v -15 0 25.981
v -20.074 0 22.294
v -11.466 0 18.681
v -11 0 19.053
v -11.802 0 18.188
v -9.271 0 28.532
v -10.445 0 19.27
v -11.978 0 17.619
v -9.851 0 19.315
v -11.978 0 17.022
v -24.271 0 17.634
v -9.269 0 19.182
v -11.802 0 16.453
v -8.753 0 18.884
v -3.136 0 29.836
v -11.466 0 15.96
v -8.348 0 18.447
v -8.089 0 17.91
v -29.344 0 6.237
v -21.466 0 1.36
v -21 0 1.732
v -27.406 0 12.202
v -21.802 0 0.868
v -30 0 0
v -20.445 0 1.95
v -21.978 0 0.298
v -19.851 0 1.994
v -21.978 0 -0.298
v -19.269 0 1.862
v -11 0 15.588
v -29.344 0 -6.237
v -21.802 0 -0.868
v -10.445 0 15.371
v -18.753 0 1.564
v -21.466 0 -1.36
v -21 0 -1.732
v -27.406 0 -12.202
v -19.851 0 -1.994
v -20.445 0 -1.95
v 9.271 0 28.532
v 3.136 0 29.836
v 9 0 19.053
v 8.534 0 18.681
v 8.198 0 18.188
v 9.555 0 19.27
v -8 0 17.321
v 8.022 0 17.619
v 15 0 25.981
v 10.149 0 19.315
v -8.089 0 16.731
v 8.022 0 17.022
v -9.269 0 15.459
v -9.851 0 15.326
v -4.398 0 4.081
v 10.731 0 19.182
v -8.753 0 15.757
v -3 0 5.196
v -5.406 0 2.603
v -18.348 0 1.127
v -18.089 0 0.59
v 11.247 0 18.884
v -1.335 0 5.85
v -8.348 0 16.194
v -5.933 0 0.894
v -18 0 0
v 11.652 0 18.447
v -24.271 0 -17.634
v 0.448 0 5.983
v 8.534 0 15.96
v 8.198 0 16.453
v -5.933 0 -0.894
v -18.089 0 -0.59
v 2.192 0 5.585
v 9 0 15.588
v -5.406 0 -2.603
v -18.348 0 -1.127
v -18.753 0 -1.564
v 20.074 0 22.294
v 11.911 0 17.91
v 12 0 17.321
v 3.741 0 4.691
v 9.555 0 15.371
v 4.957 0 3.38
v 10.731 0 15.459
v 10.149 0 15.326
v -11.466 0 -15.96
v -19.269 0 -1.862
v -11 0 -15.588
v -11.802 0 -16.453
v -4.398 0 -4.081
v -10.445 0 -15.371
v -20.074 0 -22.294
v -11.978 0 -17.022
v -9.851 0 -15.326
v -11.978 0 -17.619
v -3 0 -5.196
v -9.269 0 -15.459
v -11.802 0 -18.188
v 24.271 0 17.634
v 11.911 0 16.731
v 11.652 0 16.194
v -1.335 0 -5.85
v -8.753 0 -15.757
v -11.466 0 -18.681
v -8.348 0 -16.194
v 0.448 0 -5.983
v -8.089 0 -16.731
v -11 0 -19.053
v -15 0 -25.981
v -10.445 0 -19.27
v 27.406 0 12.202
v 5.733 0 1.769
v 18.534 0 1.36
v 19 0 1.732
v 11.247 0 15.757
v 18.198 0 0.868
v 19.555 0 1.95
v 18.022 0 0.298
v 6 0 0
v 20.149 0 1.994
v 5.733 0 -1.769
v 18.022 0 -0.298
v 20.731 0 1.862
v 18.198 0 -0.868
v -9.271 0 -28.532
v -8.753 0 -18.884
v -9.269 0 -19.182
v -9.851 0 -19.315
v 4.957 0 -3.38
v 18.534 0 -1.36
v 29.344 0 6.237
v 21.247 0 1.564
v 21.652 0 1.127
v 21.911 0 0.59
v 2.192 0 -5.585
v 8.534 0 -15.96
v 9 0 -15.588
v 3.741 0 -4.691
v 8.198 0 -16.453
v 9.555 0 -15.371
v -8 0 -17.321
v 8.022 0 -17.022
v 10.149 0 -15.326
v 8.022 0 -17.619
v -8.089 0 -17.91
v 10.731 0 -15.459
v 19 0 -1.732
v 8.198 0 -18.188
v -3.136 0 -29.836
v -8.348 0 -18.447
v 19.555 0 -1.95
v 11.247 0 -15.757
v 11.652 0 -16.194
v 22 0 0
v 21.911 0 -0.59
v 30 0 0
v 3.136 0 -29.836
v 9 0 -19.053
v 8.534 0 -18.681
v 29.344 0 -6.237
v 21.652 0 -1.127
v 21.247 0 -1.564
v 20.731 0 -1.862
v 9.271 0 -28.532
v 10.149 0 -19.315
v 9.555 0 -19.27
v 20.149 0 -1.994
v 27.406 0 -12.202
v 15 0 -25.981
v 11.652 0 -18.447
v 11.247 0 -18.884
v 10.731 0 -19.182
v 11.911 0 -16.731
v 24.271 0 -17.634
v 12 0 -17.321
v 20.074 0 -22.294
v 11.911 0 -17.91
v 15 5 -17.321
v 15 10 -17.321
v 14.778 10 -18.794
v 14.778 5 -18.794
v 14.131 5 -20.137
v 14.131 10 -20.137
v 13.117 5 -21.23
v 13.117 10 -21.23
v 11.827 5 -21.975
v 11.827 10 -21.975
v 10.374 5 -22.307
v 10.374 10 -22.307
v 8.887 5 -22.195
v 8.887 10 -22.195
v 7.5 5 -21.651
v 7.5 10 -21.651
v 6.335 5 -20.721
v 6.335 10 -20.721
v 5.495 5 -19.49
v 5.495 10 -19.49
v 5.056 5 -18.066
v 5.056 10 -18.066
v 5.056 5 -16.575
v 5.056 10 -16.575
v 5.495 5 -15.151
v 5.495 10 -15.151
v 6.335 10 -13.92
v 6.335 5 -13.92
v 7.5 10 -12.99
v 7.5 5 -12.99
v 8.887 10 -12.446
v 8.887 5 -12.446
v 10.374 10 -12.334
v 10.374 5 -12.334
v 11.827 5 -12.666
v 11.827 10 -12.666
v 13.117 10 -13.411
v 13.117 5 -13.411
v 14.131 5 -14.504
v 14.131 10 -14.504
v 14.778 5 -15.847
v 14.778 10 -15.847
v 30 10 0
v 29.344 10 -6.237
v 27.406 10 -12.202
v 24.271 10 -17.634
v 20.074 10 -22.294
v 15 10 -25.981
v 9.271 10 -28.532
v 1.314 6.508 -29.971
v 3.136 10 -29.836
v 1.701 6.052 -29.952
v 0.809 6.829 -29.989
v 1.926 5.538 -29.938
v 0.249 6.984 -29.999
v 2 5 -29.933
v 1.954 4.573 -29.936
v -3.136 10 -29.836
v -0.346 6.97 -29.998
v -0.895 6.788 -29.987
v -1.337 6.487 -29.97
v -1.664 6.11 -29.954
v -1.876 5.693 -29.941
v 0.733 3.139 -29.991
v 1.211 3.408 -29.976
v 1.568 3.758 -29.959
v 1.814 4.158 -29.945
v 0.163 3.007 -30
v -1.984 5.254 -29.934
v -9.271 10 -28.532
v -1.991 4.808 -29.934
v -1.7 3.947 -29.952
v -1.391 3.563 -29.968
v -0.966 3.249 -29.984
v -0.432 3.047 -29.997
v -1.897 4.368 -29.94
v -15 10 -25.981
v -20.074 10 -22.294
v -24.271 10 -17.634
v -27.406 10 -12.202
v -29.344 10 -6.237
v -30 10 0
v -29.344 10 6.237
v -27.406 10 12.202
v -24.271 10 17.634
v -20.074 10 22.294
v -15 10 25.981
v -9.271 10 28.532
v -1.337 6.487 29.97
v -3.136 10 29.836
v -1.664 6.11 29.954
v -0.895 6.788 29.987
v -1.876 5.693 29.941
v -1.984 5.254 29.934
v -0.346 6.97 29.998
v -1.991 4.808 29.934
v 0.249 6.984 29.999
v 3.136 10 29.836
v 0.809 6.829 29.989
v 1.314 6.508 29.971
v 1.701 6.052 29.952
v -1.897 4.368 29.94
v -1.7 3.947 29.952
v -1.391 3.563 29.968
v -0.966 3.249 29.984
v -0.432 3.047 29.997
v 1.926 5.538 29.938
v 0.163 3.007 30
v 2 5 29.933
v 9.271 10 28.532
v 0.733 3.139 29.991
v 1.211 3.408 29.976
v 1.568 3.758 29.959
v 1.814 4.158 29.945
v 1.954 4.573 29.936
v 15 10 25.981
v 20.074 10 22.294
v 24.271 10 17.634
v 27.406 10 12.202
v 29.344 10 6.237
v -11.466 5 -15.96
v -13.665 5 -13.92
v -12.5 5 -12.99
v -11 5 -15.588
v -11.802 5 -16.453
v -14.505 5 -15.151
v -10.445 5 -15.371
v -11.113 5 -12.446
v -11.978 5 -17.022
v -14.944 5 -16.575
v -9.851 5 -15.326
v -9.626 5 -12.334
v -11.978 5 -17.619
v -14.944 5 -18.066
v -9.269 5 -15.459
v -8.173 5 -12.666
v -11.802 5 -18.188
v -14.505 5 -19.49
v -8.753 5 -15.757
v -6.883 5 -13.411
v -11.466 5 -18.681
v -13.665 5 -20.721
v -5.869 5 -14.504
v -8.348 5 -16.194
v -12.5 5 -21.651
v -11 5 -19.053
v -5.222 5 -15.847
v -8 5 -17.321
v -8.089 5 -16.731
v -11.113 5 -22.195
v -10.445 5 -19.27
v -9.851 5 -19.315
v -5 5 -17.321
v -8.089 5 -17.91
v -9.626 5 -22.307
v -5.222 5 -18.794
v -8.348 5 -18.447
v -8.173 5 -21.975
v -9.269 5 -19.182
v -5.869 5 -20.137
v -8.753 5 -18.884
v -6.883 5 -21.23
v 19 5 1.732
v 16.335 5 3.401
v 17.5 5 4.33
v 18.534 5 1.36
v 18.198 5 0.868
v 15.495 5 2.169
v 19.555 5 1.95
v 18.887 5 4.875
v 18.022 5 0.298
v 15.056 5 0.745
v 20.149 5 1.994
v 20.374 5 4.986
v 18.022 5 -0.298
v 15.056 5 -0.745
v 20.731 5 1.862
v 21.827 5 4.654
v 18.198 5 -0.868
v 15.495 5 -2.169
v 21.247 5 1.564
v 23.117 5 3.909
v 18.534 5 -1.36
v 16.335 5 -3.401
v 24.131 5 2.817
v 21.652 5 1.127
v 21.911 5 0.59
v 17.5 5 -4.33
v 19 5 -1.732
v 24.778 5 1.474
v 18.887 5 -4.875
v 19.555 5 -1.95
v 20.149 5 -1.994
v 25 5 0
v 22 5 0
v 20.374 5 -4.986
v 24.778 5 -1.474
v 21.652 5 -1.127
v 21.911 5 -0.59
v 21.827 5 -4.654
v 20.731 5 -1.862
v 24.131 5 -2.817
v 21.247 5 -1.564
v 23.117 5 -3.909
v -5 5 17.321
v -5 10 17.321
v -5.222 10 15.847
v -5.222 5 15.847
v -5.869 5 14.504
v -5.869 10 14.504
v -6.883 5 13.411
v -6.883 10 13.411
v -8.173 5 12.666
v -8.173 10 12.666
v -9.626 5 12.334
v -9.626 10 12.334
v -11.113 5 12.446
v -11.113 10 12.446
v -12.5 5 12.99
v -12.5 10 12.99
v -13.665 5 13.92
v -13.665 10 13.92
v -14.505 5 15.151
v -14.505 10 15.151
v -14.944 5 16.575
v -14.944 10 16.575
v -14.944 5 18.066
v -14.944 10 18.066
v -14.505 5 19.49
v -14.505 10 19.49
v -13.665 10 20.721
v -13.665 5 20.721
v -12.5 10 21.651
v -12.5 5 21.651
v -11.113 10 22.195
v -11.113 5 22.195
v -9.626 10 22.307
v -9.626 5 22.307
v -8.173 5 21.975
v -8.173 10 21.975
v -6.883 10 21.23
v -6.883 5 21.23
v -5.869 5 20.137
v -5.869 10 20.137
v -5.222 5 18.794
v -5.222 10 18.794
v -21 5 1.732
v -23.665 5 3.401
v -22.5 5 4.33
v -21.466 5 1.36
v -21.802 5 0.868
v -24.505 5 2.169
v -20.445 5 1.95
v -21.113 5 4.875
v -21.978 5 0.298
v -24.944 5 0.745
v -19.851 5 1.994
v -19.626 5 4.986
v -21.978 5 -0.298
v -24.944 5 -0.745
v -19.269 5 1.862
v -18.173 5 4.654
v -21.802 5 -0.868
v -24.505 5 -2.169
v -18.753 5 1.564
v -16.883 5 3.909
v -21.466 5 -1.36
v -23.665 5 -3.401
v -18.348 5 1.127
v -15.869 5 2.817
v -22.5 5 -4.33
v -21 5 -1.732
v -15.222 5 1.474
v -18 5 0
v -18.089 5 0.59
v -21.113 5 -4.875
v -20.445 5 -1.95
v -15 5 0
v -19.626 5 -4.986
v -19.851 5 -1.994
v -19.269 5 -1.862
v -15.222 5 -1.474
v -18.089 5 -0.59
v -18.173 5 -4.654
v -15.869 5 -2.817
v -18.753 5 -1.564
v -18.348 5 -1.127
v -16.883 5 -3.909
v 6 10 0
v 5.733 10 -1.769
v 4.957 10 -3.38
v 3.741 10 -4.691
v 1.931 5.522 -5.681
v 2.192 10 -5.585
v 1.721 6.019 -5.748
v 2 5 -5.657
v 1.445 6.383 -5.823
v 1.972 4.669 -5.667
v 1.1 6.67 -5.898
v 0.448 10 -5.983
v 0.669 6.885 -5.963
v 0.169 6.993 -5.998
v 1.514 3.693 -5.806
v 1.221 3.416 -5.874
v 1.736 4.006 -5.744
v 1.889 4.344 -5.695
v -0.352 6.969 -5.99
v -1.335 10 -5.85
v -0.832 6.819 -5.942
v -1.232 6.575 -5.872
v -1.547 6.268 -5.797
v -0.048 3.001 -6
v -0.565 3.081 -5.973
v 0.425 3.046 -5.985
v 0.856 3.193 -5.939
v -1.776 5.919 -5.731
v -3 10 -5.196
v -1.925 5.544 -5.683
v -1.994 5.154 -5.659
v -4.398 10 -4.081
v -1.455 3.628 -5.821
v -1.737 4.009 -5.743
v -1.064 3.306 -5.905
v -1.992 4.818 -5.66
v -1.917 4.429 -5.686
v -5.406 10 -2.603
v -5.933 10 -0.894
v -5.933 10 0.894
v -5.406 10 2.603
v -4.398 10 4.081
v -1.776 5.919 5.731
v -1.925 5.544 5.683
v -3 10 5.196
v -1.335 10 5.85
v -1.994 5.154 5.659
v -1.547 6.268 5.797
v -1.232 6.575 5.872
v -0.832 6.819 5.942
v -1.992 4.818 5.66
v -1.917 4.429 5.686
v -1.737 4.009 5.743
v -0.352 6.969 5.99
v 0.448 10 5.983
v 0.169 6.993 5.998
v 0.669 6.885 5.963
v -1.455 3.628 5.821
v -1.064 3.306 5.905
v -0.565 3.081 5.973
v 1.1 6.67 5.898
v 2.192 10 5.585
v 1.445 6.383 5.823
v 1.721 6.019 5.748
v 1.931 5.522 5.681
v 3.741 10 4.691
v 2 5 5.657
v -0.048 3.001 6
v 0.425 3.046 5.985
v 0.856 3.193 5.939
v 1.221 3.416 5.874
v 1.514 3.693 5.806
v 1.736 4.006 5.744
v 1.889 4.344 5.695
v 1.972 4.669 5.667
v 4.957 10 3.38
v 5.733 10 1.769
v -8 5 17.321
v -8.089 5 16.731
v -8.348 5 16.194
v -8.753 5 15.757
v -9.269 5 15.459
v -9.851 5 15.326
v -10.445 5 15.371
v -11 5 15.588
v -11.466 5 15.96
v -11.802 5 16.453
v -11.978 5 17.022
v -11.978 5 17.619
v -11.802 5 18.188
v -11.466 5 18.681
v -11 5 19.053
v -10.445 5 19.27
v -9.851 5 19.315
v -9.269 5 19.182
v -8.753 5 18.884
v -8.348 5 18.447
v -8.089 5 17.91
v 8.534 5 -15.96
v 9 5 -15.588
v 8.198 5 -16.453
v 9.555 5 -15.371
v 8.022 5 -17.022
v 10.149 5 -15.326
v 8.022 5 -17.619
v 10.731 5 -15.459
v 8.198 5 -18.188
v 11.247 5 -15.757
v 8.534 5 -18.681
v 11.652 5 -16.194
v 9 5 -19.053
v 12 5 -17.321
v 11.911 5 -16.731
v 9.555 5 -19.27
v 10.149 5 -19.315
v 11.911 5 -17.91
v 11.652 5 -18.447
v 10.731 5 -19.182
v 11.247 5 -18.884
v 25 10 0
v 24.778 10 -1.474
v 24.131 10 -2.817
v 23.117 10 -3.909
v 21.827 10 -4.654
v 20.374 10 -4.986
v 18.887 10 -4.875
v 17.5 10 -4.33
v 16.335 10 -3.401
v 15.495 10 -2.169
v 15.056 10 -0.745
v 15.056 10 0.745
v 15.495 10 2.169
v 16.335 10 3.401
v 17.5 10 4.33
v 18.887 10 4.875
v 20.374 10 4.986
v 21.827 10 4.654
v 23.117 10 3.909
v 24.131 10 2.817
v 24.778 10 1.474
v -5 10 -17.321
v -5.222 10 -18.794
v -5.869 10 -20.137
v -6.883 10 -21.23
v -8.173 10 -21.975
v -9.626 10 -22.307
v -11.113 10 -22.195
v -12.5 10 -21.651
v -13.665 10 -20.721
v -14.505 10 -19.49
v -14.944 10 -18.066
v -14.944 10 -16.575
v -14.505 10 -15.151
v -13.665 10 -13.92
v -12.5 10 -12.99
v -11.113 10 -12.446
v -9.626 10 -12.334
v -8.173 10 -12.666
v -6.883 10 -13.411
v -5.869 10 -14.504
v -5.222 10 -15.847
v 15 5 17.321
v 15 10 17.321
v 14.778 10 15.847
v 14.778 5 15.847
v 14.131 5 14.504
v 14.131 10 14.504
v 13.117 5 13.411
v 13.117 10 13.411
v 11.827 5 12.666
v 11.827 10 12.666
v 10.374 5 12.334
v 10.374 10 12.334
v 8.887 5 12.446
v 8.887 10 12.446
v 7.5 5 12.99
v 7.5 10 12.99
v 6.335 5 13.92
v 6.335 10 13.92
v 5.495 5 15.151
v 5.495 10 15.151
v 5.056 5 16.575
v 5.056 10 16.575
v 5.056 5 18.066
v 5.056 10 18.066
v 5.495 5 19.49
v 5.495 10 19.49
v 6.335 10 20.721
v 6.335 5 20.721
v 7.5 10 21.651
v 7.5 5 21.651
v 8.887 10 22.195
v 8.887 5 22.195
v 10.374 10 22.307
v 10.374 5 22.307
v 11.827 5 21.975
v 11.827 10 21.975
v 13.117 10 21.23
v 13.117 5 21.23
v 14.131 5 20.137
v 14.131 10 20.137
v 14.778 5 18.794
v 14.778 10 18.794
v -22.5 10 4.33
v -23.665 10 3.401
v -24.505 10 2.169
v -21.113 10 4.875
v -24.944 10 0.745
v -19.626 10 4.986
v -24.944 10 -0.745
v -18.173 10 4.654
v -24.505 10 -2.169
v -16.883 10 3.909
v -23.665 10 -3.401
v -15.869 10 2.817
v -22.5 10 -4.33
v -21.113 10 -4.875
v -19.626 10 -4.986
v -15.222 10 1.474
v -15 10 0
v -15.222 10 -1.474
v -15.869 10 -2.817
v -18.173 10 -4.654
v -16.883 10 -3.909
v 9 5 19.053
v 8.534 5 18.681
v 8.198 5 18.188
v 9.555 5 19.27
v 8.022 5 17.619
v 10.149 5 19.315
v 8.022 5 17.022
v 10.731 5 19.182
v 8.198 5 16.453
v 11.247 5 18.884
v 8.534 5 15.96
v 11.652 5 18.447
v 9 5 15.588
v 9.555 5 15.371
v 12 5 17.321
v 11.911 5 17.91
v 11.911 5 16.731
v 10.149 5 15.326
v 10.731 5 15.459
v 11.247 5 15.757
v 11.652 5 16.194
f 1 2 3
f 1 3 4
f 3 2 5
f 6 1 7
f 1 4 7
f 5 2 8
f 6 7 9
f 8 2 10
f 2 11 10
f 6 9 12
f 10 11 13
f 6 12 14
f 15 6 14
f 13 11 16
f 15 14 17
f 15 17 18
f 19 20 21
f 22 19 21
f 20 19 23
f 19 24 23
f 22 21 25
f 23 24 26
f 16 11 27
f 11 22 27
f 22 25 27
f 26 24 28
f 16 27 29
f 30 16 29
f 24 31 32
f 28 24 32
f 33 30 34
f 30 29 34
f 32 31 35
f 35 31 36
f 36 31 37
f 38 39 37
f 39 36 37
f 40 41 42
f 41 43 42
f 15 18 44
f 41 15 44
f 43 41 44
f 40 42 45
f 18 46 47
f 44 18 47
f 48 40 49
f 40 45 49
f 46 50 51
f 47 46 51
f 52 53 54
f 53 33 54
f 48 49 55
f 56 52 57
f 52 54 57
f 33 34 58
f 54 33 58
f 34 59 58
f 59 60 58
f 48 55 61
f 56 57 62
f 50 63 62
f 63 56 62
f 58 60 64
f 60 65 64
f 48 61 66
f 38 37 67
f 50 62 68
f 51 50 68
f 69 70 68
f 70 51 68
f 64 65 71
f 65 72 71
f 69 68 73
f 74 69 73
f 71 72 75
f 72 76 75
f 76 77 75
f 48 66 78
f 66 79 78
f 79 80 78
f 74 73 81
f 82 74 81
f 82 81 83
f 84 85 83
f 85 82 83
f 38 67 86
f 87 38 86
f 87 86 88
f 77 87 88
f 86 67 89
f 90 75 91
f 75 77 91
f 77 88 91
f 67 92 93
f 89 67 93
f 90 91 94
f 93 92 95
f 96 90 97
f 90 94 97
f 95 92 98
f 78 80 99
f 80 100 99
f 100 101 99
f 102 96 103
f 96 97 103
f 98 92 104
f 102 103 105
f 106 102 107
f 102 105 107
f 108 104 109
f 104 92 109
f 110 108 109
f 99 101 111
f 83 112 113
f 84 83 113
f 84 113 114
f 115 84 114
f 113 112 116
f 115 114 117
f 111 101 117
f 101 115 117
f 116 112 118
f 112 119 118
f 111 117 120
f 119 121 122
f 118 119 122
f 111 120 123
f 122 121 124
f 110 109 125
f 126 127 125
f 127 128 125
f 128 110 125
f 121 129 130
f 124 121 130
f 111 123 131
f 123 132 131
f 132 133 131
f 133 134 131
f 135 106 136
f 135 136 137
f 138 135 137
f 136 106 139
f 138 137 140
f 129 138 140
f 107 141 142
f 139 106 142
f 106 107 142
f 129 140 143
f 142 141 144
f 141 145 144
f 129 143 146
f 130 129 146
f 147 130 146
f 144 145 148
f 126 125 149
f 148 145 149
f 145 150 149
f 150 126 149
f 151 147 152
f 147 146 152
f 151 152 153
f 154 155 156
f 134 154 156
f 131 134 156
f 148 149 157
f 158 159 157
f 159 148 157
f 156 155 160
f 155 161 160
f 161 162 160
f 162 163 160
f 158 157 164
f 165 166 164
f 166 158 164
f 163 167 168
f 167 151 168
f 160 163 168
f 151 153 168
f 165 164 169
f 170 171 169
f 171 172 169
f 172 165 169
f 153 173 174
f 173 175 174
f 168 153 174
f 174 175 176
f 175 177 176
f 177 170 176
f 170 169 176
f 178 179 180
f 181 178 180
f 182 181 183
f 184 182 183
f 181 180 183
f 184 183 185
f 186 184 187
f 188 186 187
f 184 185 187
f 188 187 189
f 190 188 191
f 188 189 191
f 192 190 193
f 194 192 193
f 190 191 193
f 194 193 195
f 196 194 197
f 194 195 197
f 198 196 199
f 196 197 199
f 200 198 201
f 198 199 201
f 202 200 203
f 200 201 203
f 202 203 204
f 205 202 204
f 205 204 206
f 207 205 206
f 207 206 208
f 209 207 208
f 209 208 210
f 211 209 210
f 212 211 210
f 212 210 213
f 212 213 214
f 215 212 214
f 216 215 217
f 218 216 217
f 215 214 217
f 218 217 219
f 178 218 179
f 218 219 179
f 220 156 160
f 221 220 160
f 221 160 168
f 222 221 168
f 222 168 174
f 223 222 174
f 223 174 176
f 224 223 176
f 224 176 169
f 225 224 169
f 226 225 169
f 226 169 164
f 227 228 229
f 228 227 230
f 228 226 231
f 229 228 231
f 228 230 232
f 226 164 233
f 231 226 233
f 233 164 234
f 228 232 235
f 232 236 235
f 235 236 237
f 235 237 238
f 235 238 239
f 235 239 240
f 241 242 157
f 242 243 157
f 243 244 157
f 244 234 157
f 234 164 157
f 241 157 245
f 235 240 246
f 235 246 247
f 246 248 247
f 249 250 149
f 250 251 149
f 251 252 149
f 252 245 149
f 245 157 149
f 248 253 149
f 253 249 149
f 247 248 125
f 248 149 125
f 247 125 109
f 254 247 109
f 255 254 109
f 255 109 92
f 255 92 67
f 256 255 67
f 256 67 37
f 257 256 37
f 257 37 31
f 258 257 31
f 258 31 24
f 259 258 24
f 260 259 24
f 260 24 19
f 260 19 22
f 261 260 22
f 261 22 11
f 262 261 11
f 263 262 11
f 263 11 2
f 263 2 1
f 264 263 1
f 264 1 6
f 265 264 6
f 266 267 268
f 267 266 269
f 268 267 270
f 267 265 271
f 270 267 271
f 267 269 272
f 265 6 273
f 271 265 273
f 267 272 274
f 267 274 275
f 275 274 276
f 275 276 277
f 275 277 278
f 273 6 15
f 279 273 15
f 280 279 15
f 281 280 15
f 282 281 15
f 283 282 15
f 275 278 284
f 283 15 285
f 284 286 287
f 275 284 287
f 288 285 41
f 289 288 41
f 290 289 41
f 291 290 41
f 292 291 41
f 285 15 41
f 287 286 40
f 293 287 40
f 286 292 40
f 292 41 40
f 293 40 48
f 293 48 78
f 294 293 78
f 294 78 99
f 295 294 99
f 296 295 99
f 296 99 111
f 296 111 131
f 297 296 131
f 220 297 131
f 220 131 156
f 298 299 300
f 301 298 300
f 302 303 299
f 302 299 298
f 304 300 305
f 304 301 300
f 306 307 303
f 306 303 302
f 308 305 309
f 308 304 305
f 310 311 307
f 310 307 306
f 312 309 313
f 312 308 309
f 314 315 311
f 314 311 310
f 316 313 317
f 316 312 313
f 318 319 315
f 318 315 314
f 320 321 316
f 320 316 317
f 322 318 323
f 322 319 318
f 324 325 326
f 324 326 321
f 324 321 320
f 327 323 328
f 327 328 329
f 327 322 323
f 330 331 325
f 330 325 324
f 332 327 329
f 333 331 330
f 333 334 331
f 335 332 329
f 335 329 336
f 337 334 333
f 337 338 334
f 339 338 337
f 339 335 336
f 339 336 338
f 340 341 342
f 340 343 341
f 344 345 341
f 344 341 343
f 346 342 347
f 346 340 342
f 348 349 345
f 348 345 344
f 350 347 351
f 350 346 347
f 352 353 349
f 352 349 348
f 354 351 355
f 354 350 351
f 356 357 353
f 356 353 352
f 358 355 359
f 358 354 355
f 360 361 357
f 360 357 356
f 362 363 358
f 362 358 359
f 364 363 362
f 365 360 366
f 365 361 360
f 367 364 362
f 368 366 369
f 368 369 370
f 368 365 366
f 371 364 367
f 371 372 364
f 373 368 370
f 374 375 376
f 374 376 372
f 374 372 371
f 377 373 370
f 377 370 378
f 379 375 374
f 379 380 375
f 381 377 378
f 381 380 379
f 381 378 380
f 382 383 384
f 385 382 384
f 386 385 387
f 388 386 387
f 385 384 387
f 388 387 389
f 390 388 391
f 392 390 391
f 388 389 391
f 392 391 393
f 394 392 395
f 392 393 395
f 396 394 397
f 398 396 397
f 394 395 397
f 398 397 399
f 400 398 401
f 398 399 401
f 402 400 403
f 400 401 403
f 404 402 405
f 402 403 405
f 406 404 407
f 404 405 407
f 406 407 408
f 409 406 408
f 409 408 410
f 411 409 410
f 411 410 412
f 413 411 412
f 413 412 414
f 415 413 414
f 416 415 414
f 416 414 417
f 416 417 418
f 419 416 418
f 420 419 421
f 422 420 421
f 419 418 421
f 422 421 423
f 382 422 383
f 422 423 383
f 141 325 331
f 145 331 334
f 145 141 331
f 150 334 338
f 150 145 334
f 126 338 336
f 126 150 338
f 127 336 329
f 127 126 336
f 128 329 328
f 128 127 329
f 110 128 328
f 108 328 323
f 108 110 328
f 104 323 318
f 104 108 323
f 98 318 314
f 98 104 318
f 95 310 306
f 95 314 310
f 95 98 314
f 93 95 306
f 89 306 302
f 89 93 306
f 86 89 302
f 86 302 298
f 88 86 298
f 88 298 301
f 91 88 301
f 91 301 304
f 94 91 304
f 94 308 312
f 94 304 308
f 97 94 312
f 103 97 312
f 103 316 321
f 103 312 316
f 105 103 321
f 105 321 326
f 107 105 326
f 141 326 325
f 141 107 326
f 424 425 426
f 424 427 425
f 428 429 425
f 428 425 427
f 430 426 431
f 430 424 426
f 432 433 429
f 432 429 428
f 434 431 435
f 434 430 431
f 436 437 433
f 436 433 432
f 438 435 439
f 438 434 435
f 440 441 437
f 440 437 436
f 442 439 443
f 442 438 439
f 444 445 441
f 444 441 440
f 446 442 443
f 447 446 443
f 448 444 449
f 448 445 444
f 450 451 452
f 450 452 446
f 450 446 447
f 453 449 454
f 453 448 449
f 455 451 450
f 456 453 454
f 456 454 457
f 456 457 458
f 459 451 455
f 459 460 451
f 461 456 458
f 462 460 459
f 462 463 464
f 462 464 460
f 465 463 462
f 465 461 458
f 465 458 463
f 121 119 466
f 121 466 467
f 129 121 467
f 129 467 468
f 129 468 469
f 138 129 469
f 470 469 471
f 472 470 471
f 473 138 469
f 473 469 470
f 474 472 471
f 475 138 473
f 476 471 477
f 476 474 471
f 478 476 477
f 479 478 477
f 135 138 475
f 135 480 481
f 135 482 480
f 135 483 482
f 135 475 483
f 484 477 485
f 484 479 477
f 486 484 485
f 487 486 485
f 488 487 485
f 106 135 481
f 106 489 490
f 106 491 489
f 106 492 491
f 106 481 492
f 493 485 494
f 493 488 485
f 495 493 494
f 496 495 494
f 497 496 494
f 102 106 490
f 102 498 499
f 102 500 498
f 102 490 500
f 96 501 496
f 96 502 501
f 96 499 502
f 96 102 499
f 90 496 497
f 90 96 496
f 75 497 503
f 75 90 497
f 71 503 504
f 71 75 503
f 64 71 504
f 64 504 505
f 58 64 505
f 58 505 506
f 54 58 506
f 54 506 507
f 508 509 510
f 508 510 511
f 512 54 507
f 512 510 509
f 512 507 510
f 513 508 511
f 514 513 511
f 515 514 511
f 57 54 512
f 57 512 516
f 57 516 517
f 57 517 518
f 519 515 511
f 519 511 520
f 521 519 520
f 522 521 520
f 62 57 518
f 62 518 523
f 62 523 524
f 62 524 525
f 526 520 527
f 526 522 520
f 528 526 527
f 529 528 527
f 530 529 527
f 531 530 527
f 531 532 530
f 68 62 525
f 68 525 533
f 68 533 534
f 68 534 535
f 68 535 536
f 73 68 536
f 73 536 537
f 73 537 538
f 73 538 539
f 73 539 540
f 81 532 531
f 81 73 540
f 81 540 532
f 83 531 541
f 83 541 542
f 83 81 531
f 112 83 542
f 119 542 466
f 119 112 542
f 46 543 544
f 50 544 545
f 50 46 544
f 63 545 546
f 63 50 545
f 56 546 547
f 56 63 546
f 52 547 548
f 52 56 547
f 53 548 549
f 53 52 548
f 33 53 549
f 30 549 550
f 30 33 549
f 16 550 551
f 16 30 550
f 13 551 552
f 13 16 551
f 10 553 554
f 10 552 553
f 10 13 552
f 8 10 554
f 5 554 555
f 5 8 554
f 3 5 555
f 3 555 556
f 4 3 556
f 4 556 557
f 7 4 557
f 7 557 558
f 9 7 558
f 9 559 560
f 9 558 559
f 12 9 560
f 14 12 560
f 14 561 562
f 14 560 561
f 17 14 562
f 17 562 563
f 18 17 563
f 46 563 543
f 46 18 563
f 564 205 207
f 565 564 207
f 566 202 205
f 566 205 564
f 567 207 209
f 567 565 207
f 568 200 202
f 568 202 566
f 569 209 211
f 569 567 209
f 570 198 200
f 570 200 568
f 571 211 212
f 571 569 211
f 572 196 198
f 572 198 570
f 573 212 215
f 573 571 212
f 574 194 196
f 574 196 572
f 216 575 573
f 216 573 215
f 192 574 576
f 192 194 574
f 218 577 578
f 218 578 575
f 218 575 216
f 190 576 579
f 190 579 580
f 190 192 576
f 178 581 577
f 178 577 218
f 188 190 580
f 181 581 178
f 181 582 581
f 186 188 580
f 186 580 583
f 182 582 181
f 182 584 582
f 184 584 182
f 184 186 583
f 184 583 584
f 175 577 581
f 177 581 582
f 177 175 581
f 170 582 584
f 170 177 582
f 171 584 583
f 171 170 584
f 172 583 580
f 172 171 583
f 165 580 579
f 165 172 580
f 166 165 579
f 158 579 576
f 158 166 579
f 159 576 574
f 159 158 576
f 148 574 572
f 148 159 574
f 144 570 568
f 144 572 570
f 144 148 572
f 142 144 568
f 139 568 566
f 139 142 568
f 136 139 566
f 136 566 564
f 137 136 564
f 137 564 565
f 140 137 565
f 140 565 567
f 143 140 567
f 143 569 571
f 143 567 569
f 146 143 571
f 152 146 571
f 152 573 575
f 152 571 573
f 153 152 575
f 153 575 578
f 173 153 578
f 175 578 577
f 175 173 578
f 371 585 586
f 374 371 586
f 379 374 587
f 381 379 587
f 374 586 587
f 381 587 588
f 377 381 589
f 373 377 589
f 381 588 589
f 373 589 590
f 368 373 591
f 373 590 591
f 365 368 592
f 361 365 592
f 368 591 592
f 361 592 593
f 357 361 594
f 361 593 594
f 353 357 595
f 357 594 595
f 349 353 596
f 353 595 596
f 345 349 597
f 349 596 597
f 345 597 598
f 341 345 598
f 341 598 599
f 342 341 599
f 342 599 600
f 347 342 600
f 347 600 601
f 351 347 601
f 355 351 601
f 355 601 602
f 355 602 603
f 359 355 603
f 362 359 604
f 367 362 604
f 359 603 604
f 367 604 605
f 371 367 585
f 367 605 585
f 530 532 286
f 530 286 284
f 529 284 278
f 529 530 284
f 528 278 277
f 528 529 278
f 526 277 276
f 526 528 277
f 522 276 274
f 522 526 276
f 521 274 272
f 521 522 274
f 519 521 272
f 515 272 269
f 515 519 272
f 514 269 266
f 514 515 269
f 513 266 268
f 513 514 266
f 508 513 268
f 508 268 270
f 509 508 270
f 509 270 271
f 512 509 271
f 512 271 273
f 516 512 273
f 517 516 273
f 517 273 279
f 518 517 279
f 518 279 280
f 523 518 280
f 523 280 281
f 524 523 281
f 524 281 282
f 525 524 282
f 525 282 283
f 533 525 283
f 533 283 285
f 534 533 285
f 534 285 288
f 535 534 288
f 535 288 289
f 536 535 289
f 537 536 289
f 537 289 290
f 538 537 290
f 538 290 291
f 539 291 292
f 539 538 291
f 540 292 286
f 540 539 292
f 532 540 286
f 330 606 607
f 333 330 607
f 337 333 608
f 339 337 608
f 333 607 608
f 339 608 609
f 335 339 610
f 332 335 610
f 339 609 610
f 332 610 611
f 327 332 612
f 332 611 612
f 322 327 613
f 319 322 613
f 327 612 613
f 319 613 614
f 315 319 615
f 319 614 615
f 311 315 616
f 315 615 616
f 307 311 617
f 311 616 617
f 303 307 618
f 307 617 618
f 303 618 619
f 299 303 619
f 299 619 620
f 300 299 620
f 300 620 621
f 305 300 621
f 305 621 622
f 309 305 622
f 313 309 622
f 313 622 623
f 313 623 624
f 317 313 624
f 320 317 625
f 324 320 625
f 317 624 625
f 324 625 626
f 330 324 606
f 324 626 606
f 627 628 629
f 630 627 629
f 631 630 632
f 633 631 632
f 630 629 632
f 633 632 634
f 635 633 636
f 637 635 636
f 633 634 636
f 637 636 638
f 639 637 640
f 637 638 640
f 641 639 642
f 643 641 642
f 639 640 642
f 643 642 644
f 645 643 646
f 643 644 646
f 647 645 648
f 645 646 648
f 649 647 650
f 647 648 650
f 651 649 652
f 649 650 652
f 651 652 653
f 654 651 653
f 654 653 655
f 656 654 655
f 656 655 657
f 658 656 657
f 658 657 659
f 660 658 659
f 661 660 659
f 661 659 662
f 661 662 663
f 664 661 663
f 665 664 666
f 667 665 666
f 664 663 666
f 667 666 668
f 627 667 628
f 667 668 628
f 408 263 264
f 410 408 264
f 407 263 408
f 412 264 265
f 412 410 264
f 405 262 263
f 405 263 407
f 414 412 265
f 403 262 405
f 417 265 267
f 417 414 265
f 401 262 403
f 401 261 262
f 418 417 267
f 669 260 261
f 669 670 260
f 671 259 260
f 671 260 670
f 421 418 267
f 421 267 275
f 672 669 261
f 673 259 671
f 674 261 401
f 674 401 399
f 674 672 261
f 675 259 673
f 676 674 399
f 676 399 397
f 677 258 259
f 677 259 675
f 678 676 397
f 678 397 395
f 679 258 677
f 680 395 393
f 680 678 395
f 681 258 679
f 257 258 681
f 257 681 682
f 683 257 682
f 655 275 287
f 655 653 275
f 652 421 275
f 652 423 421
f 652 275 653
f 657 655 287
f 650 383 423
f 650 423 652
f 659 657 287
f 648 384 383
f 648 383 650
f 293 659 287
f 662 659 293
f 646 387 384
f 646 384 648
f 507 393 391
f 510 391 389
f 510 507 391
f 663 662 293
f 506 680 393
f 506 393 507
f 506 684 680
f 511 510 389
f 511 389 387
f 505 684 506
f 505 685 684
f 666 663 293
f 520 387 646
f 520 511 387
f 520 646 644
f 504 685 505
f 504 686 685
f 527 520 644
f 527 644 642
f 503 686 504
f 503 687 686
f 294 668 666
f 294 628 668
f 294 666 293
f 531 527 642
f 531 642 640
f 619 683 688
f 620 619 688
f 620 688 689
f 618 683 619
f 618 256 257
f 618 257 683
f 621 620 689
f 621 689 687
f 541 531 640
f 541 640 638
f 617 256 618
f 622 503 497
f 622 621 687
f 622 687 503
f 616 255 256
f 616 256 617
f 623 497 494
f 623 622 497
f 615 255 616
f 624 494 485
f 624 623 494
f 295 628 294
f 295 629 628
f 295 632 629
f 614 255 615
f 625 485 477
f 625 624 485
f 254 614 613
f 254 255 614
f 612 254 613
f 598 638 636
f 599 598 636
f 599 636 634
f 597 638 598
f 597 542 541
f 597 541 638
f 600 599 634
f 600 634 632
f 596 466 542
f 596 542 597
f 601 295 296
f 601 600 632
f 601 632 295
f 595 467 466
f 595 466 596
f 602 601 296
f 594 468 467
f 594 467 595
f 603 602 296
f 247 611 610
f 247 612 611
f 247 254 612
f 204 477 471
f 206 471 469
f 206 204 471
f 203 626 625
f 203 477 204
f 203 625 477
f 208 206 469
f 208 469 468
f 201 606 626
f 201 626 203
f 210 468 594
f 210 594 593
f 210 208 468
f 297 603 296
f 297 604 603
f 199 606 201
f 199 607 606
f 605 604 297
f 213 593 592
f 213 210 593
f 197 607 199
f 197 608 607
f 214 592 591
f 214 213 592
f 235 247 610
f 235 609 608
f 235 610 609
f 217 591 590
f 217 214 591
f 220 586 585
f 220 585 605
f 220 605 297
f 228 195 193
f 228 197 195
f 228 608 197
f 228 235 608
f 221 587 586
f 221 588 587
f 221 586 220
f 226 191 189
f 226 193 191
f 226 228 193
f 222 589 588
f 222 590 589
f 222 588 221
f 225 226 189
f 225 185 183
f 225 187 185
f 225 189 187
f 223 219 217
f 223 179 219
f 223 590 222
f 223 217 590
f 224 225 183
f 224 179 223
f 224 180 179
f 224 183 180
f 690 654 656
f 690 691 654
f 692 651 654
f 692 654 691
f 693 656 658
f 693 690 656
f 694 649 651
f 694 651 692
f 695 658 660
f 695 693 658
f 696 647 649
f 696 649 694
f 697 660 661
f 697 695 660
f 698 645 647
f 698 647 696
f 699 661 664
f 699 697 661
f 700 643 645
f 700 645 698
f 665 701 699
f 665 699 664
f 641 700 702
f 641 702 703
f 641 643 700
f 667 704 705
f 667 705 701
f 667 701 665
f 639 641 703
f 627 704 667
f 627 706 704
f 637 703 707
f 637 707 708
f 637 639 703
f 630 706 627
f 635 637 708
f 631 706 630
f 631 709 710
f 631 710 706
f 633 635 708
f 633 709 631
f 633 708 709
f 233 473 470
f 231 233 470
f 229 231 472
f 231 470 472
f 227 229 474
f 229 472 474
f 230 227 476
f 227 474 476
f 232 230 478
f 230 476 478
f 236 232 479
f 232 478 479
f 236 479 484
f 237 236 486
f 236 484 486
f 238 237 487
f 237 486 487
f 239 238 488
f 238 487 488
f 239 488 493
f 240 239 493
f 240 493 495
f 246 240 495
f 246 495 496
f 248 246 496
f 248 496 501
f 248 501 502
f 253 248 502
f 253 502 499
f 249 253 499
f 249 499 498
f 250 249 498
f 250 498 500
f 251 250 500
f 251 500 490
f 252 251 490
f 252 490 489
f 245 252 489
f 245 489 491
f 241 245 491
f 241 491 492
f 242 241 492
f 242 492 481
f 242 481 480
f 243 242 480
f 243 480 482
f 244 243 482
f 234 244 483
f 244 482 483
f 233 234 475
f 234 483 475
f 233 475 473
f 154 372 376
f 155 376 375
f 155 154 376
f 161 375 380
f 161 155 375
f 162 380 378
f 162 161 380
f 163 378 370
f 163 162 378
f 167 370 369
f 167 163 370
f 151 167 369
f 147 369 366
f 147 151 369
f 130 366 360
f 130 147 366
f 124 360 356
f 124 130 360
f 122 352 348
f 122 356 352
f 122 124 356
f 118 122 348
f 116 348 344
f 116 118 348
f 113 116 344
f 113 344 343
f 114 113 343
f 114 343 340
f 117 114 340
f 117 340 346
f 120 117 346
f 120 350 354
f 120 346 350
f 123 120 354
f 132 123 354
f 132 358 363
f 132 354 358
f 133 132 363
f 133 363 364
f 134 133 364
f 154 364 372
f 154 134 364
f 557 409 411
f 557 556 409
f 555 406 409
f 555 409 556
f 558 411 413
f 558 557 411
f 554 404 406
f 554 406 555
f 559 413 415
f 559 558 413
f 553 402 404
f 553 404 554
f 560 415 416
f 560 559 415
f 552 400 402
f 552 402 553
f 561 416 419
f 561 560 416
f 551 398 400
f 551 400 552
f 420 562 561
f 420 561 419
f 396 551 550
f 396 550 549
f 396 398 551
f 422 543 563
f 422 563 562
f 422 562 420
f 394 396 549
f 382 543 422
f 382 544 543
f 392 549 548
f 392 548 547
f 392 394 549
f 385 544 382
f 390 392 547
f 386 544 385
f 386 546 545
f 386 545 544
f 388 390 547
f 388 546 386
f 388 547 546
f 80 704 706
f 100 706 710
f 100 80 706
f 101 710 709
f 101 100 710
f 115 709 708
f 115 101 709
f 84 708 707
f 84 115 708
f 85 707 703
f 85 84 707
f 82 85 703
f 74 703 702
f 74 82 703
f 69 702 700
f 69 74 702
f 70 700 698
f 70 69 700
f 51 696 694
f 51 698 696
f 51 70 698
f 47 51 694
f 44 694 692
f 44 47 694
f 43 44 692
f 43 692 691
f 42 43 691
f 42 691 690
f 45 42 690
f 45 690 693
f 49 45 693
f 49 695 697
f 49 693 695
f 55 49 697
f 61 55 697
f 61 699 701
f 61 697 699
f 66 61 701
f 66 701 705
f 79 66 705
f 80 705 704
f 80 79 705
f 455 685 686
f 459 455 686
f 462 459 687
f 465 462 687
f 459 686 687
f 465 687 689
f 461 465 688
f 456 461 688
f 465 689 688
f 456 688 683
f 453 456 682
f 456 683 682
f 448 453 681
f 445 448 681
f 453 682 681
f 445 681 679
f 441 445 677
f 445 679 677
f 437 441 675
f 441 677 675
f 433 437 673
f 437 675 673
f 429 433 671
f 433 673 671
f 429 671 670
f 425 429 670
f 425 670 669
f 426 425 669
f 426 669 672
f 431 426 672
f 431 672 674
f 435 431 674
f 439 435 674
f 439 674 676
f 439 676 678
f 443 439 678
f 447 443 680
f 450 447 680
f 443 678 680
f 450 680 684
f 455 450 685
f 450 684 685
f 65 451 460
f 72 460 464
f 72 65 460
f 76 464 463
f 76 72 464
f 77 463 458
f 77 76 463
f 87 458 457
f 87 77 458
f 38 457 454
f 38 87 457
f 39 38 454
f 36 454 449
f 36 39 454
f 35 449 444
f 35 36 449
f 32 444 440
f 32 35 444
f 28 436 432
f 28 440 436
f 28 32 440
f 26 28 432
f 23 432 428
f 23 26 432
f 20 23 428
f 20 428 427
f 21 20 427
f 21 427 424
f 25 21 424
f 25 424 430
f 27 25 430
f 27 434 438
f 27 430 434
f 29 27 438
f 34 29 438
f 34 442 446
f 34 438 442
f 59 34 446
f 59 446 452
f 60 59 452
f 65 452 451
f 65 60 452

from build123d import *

# Parameters (mm, degrees)
SKETCH1_R               = 30
SKETCH1_R_2             = 2
SKETCH1_R_3             = 6
BOSS_EXTRUDE1_DEPTH     = 10
SKETCH2_R               = 2
CUT_EXTRUDE1_DEPTH      = 31
CUT_EXTRUDE1_DEPTH_BACK = 31
SKETCH3_R               = 5
CUT_EXTRUDE2_DEPTH      = 5


with BuildPart() as part:
    # Sketch1 → Boss-Extrude1 (new body)
    with BuildSketch(Plane(origin=(0, 0, 0), x_dir=(1, 0, 0), z_dir=(0, 1, 0))):
        Circle(SKETCH1_R)
        with Locations((20, 0)):
            Circle(SKETCH1_R_2, mode=Mode.SUBTRACT)
        with Locations((10, -17.320508076)):
            Circle(SKETCH1_R_2, mode=Mode.SUBTRACT)
        with Locations((-10, -17.320508076)):
            Circle(SKETCH1_R_2, mode=Mode.SUBTRACT)
        with Locations((-20, 0)):
            Circle(SKETCH1_R_2, mode=Mode.SUBTRACT)
        with Locations((-10, 17.320508076)):
            Circle(SKETCH1_R_2, mode=Mode.SUBTRACT)
        with Locations((10, 17.320508076)):
            Circle(SKETCH1_R_2, mode=Mode.SUBTRACT)
        Circle(SKETCH1_R_3, mode=Mode.SUBTRACT)
    extrude(amount=BOSS_EXTRUDE1_DEPTH)

    # Sketch2 → Cut-Extrude1 (cut, two sides)
    with BuildSketch(Plane.XY) as cut_extrude1_sk:
        with Locations((0, 5)):
            Circle(SKETCH2_R)
    extrude(amount=CUT_EXTRUDE1_DEPTH, mode=Mode.SUBTRACT)
    extrude(cut_extrude1_sk.sketch, amount=-CUT_EXTRUDE1_DEPTH_BACK, mode=Mode.SUBTRACT)

    # Sketch3 → Cut-Extrude2 (cut)
    with BuildSketch(Plane(origin=(0, 10, 0), x_dir=(1, 0, 0), z_dir=(0, 1, 0))):
        with Locations((-10, 17.320508076)):
            Circle(SKETCH3_R)
        with Locations((10, 17.320508076)):
            Circle(SKETCH3_R)
        with Locations((20, 0)):
            Circle(SKETCH3_R)
        with Locations((10, -17.320508076)):
            Circle(SKETCH3_R)
        with Locations((-10, -17.320508076)):
            Circle(SKETCH3_R)
        with Locations((-20, 0)):
            Circle(SKETCH3_R)
    extrude(amount=-CUT_EXTRUDE2_DEPTH, mode=Mode.SUBTRACT)


solid = part.part
